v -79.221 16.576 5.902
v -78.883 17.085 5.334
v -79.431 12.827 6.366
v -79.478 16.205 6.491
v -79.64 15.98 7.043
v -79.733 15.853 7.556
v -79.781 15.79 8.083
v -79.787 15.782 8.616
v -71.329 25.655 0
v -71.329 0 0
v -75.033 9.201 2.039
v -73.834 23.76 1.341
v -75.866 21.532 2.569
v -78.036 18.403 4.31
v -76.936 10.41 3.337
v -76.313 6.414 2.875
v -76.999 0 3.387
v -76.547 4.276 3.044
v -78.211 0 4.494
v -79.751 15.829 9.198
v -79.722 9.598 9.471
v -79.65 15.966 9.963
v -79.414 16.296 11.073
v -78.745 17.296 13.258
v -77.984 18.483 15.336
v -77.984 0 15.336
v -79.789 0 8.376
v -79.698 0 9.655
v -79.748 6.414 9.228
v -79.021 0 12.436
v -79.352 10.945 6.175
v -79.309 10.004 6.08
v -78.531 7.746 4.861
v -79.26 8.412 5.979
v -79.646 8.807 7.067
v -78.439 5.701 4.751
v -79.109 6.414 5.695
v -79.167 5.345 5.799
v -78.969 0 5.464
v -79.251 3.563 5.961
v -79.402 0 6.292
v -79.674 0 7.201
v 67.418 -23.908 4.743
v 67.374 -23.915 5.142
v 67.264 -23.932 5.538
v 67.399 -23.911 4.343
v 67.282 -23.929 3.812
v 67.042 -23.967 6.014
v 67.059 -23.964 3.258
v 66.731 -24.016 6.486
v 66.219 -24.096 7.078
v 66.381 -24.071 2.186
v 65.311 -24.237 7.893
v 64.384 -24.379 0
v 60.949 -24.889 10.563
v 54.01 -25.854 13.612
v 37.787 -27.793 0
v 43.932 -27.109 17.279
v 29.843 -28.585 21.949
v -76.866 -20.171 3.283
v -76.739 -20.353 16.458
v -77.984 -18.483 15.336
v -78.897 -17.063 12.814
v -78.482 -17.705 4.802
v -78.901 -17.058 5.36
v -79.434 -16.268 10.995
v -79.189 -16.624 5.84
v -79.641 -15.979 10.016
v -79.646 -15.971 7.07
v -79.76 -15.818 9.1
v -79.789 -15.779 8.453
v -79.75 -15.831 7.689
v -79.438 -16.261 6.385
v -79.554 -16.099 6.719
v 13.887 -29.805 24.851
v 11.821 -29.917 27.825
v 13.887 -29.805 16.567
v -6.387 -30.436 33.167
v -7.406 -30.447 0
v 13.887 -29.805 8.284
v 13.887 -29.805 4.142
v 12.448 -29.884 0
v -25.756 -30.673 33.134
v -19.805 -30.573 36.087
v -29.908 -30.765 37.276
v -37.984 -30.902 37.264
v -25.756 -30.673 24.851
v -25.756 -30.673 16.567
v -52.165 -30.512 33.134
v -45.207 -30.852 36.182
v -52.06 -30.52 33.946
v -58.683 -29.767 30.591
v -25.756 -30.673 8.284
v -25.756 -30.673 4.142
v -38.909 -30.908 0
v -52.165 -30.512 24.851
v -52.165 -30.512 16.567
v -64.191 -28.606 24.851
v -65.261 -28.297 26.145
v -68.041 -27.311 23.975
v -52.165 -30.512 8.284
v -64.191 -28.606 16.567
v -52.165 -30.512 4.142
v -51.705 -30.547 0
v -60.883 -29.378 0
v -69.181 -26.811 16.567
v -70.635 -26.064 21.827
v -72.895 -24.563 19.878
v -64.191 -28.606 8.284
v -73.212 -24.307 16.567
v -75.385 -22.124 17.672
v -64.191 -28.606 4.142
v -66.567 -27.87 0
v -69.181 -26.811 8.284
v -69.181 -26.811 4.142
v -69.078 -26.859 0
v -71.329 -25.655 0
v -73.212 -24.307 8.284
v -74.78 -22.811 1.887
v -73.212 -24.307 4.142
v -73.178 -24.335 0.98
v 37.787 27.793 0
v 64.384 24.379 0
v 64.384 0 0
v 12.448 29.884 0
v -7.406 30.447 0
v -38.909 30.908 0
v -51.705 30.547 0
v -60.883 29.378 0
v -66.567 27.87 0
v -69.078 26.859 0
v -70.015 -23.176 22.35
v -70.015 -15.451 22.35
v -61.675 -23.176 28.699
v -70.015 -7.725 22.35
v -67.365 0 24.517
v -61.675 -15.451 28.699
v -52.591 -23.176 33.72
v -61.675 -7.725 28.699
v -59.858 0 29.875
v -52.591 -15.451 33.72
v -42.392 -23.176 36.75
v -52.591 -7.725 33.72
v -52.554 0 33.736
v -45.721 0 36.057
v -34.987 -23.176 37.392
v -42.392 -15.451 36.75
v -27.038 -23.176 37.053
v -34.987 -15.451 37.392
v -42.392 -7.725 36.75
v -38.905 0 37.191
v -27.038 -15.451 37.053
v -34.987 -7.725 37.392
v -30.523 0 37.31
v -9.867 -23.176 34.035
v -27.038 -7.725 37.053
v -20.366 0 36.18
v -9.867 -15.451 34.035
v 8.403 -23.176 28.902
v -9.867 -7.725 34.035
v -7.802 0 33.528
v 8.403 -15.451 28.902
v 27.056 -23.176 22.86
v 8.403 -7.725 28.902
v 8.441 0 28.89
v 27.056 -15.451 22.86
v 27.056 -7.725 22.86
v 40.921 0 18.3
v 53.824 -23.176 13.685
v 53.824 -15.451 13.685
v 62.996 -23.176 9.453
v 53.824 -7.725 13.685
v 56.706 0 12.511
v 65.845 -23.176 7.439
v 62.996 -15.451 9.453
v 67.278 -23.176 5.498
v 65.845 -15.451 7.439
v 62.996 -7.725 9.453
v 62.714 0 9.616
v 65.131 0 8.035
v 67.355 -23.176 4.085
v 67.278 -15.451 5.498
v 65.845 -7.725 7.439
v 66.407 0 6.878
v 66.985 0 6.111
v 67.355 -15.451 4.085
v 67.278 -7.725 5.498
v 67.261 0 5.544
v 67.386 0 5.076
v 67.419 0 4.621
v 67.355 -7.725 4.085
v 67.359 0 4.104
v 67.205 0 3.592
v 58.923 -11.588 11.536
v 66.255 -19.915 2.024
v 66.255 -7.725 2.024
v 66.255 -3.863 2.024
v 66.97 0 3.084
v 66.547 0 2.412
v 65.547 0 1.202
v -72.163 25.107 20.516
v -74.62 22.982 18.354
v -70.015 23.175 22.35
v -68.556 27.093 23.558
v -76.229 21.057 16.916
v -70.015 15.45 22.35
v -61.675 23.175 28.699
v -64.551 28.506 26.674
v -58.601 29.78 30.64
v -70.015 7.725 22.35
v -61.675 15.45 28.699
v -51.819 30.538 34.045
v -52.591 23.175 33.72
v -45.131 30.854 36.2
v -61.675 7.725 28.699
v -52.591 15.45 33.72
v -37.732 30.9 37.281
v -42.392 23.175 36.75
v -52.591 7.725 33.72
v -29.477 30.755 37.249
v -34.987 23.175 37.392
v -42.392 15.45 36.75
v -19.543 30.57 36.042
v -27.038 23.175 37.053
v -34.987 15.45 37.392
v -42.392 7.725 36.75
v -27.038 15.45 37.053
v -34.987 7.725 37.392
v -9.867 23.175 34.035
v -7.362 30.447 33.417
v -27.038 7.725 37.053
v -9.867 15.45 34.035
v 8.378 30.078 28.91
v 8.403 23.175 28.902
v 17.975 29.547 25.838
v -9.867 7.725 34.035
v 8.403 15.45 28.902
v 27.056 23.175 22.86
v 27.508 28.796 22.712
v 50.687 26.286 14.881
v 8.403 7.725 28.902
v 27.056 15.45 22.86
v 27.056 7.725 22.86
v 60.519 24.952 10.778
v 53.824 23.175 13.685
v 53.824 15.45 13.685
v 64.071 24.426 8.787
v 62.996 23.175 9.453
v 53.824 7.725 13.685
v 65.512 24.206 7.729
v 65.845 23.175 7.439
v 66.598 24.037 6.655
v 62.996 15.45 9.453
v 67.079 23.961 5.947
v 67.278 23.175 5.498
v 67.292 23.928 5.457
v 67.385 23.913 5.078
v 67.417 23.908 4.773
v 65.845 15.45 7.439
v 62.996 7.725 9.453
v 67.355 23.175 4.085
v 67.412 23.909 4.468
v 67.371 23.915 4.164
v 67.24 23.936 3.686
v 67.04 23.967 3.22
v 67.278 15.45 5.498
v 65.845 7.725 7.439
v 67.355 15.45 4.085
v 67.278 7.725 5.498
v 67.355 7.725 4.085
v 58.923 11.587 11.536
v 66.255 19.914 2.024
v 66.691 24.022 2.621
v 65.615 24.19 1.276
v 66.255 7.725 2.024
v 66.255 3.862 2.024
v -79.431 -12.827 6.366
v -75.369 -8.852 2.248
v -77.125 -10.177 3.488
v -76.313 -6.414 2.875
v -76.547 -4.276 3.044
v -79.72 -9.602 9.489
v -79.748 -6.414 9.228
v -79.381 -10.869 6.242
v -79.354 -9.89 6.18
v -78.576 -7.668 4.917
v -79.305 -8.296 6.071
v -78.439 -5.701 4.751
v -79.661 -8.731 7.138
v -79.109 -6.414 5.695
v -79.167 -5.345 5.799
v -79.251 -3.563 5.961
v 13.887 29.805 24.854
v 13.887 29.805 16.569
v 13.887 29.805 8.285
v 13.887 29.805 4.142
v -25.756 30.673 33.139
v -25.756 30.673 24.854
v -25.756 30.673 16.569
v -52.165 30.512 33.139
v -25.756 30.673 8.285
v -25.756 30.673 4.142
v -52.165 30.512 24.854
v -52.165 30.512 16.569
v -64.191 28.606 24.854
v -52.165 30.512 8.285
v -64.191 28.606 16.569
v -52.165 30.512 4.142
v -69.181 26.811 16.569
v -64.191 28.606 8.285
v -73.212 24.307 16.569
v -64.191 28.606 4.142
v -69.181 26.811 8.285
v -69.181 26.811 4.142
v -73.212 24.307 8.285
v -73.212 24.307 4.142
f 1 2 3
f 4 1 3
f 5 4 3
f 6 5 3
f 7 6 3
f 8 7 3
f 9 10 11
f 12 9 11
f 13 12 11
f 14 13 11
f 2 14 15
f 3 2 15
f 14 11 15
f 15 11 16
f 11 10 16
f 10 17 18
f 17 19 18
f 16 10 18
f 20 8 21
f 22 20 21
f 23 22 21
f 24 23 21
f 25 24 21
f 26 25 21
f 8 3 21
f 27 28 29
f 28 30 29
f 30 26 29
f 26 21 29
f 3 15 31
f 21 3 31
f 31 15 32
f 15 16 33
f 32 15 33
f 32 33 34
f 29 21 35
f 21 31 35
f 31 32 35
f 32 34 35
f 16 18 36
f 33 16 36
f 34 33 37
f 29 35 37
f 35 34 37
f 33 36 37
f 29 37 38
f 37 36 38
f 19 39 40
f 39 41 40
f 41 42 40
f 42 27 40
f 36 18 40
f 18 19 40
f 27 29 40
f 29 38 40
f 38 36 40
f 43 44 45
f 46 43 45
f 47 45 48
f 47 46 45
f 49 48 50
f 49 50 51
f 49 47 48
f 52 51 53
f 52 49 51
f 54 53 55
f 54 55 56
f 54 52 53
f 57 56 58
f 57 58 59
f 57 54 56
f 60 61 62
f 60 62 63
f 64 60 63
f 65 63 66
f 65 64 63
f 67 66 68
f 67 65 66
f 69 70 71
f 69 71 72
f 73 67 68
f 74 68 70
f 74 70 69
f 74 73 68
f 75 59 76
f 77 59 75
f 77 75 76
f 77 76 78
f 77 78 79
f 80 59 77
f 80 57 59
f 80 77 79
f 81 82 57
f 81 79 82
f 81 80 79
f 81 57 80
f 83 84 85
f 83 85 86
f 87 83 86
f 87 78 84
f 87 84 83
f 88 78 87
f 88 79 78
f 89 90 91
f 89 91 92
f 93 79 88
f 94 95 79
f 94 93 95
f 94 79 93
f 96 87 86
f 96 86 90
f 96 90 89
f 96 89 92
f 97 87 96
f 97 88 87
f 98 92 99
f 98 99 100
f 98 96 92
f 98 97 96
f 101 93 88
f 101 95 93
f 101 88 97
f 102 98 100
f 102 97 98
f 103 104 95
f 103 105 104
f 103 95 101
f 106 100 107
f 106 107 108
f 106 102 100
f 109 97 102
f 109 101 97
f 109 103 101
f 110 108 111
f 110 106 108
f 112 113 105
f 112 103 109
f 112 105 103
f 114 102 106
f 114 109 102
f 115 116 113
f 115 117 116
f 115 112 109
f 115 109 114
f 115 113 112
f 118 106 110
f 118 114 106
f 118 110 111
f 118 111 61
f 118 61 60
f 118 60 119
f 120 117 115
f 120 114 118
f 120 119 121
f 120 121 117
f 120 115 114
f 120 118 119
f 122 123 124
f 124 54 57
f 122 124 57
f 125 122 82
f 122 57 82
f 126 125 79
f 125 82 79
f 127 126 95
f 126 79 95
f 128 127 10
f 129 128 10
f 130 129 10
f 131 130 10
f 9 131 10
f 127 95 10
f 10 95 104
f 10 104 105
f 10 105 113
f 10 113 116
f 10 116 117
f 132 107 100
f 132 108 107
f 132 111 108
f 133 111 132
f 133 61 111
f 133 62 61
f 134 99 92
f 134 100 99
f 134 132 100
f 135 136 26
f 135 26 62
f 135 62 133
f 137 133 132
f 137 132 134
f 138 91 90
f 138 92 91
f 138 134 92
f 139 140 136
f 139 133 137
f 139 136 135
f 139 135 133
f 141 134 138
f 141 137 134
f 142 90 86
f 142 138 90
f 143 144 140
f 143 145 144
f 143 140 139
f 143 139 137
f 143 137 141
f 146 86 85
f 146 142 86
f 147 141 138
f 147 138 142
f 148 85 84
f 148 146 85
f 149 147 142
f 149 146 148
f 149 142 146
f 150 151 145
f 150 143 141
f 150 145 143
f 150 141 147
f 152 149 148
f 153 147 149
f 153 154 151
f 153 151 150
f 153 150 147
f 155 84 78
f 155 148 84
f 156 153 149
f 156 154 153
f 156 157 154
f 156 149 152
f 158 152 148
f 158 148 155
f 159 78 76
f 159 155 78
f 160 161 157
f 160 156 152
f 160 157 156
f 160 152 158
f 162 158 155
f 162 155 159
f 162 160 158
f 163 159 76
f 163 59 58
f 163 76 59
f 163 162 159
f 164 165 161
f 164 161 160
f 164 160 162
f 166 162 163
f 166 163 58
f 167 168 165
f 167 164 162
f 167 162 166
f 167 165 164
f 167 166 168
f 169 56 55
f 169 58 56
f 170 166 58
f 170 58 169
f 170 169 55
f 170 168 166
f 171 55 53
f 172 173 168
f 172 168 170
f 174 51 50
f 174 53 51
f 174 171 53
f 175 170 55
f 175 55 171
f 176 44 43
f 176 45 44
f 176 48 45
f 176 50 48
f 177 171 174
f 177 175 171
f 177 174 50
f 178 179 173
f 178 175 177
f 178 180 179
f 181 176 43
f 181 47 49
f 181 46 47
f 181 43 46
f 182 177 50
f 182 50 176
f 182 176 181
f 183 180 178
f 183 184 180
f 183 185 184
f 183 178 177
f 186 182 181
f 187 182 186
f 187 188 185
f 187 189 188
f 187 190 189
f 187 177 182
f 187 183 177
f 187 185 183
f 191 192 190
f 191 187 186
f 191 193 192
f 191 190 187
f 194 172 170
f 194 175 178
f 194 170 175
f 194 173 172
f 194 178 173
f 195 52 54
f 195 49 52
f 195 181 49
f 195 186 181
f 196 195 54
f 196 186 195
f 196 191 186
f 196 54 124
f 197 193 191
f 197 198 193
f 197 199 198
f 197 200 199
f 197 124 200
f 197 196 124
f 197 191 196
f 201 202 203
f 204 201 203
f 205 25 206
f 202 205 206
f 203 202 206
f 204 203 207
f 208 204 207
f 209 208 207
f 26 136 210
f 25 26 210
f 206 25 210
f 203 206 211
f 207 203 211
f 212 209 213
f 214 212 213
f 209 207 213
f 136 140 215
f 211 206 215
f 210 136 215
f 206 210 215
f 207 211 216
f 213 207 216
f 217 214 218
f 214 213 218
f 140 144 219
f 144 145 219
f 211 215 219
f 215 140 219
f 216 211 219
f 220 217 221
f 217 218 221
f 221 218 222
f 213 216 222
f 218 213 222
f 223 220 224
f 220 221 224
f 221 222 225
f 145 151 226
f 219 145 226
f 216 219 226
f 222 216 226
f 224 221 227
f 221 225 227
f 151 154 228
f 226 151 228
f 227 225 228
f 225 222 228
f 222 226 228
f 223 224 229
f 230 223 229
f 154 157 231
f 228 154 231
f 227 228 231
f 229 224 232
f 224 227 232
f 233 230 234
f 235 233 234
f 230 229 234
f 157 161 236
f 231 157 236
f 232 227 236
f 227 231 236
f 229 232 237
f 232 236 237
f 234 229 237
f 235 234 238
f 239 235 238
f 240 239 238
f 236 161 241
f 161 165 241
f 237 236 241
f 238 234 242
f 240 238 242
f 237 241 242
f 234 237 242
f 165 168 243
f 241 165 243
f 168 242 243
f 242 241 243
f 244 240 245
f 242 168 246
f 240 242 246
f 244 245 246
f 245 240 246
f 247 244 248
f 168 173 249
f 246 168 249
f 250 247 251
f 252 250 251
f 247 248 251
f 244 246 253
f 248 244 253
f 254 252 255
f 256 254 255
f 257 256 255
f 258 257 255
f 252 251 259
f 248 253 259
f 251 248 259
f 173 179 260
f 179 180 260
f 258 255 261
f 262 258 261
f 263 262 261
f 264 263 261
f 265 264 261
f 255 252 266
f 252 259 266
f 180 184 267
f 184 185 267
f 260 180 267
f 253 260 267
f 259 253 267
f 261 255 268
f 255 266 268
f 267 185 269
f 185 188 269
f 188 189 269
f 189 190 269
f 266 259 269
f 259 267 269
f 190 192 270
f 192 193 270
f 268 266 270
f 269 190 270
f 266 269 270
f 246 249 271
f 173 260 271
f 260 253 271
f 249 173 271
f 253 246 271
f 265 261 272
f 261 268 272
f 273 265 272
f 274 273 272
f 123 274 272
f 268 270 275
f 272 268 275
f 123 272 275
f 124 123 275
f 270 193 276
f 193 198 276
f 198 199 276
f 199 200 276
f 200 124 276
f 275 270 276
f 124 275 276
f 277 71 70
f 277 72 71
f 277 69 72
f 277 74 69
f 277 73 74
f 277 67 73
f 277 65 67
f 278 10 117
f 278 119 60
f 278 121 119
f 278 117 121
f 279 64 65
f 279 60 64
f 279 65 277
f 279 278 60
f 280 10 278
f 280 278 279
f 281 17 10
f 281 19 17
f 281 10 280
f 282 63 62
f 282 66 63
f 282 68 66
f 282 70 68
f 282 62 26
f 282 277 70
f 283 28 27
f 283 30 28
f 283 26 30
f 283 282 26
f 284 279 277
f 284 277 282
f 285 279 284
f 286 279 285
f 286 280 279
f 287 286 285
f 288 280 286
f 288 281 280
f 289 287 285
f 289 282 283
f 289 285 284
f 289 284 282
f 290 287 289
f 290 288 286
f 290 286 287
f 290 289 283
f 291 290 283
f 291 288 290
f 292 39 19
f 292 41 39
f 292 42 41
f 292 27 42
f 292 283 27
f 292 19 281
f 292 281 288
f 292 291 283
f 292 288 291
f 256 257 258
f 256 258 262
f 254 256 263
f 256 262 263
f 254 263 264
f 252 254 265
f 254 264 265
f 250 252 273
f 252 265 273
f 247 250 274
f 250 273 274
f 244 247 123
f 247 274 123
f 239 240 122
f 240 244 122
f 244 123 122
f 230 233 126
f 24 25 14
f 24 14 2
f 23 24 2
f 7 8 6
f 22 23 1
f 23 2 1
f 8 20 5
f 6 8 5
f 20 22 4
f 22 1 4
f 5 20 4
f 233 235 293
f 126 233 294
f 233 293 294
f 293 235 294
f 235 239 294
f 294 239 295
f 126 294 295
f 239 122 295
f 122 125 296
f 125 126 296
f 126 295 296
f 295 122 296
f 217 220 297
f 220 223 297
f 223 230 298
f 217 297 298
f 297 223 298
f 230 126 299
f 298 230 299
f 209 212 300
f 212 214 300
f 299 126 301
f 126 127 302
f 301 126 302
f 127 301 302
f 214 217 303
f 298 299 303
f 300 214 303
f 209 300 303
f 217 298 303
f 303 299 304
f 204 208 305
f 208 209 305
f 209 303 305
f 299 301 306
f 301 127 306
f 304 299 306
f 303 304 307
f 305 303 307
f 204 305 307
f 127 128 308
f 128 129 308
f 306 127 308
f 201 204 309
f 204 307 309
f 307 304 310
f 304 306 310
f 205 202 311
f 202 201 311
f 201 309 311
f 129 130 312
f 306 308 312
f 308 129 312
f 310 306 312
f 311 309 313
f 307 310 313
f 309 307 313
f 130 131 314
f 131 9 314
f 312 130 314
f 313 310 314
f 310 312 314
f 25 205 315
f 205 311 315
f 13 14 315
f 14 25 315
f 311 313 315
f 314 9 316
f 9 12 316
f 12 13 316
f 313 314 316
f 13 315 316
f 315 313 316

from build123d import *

# Parameters (mm, degrees)
F1_DEPTH = 33.02
F3_DEPTH = 46.228


with BuildPart() as f1:
    # F0 (on Front) → F1 (new body, symmetric)
    with BuildSketch(Plane.XZ):
        with BuildLine():
            add(Edge.make_bspline(
                [(-77.9844298959, 15.3364567086), (-67.441559708, 24.8348439385), (-43.1319946928, 46.7360584835), (22.46335452, 23.9693705903), (72.659725133, 8.35028032), (66.1617990206, 1.7936686418), (64.3841847777, 0)],
                knots=[0, 0, 0, 0, 0.2688517645, 0.6199136794, 0.8960211542, 1, 1, 1, 1], degree=3))
            add(Edge.make_bspline(
                [(-71.3289901614, 0), (-74.858591664, 1.8481354579), (-81.7026713629, 5.4317656097), (-79.1975971976, 12.1048087693), (-77.9844298959, 15.3364567086)],
                knots=[0, 0, 0, 0, 0.5157160141, 1, 1, 1, 1], degree=3))
            add(Edge.make_bspline(
                [(64.3841847777, 0), (19.146459798, 0), (-26.0912651817, 0), (-71.3289901614, 0)],
                knots=[0, 0, 0, 0, 135.7131749392, 135.7131749392, 135.7131749392, 135.7131749392], degree=3))
        make_face()
    extrude(amount=F1_DEPTH, both=True)

    # F2 (on Top) → F3 (cut)
    with BuildSketch(Plane.XY):
        with BuildLine():
            add(Edge.make_bspline(
                [(70.3138560057, 23.4387349337), (52.7439974276, 26.3448128405), (12.422499824, 30.9157610033), (-22.4144593659, 30.0883111575), (-75.8150707057, 32.5826236572), (-81.7138541645, 2.8185815309), (-111.8653829035, 58.4975544), (-32.0404997441, 65.3267380398), (86.20435915, 72.3628390242), (102.4729090282, 17.0636754281), (81.8808994496, 21.52553061), (70.3138560057, 23.4387349337)],
                knots=[0, 0, 0, 0, 0.1261345711, 0.2315382861, 0.3473631849, 0.4107244289, 0.5073490116, 0.6400646773, 0.8230169164, 0.9169598288, 1, 1, 1, 1], degree=3))
        make_face()
        with BuildLine():
            add(Edge.make_bspline(
                [(70.3138560057, -23.4387349337), (52.7439974276, -26.3448128405), (12.422499824, -30.9157610033), (-22.4144593659, -30.0883111575), (-75.8150707057, -32.5826236572), (-81.7138541645, -2.8185815309), (-111.8653829035, -58.4975544), (-32.0404997441, -65.3267380398), (86.20435915, -72.3628390242), (102.4729090282, -17.0636754281), (81.8808994496, -21.52553061), (70.3138560057, -23.4387349337)],
                knots=[0, 0, 0, 0, 0.1261345711, 0.2315382861, 0.3473631849, 0.4107244289, 0.5073490116, 0.6400646773, 0.8230169164, 0.9169598288, 1, 1, 1, 1], degree=3))
        make_face()
    extrude(amount=F3_DEPTH, mode=Mode.SUBTRACT)


solid = f1.part
